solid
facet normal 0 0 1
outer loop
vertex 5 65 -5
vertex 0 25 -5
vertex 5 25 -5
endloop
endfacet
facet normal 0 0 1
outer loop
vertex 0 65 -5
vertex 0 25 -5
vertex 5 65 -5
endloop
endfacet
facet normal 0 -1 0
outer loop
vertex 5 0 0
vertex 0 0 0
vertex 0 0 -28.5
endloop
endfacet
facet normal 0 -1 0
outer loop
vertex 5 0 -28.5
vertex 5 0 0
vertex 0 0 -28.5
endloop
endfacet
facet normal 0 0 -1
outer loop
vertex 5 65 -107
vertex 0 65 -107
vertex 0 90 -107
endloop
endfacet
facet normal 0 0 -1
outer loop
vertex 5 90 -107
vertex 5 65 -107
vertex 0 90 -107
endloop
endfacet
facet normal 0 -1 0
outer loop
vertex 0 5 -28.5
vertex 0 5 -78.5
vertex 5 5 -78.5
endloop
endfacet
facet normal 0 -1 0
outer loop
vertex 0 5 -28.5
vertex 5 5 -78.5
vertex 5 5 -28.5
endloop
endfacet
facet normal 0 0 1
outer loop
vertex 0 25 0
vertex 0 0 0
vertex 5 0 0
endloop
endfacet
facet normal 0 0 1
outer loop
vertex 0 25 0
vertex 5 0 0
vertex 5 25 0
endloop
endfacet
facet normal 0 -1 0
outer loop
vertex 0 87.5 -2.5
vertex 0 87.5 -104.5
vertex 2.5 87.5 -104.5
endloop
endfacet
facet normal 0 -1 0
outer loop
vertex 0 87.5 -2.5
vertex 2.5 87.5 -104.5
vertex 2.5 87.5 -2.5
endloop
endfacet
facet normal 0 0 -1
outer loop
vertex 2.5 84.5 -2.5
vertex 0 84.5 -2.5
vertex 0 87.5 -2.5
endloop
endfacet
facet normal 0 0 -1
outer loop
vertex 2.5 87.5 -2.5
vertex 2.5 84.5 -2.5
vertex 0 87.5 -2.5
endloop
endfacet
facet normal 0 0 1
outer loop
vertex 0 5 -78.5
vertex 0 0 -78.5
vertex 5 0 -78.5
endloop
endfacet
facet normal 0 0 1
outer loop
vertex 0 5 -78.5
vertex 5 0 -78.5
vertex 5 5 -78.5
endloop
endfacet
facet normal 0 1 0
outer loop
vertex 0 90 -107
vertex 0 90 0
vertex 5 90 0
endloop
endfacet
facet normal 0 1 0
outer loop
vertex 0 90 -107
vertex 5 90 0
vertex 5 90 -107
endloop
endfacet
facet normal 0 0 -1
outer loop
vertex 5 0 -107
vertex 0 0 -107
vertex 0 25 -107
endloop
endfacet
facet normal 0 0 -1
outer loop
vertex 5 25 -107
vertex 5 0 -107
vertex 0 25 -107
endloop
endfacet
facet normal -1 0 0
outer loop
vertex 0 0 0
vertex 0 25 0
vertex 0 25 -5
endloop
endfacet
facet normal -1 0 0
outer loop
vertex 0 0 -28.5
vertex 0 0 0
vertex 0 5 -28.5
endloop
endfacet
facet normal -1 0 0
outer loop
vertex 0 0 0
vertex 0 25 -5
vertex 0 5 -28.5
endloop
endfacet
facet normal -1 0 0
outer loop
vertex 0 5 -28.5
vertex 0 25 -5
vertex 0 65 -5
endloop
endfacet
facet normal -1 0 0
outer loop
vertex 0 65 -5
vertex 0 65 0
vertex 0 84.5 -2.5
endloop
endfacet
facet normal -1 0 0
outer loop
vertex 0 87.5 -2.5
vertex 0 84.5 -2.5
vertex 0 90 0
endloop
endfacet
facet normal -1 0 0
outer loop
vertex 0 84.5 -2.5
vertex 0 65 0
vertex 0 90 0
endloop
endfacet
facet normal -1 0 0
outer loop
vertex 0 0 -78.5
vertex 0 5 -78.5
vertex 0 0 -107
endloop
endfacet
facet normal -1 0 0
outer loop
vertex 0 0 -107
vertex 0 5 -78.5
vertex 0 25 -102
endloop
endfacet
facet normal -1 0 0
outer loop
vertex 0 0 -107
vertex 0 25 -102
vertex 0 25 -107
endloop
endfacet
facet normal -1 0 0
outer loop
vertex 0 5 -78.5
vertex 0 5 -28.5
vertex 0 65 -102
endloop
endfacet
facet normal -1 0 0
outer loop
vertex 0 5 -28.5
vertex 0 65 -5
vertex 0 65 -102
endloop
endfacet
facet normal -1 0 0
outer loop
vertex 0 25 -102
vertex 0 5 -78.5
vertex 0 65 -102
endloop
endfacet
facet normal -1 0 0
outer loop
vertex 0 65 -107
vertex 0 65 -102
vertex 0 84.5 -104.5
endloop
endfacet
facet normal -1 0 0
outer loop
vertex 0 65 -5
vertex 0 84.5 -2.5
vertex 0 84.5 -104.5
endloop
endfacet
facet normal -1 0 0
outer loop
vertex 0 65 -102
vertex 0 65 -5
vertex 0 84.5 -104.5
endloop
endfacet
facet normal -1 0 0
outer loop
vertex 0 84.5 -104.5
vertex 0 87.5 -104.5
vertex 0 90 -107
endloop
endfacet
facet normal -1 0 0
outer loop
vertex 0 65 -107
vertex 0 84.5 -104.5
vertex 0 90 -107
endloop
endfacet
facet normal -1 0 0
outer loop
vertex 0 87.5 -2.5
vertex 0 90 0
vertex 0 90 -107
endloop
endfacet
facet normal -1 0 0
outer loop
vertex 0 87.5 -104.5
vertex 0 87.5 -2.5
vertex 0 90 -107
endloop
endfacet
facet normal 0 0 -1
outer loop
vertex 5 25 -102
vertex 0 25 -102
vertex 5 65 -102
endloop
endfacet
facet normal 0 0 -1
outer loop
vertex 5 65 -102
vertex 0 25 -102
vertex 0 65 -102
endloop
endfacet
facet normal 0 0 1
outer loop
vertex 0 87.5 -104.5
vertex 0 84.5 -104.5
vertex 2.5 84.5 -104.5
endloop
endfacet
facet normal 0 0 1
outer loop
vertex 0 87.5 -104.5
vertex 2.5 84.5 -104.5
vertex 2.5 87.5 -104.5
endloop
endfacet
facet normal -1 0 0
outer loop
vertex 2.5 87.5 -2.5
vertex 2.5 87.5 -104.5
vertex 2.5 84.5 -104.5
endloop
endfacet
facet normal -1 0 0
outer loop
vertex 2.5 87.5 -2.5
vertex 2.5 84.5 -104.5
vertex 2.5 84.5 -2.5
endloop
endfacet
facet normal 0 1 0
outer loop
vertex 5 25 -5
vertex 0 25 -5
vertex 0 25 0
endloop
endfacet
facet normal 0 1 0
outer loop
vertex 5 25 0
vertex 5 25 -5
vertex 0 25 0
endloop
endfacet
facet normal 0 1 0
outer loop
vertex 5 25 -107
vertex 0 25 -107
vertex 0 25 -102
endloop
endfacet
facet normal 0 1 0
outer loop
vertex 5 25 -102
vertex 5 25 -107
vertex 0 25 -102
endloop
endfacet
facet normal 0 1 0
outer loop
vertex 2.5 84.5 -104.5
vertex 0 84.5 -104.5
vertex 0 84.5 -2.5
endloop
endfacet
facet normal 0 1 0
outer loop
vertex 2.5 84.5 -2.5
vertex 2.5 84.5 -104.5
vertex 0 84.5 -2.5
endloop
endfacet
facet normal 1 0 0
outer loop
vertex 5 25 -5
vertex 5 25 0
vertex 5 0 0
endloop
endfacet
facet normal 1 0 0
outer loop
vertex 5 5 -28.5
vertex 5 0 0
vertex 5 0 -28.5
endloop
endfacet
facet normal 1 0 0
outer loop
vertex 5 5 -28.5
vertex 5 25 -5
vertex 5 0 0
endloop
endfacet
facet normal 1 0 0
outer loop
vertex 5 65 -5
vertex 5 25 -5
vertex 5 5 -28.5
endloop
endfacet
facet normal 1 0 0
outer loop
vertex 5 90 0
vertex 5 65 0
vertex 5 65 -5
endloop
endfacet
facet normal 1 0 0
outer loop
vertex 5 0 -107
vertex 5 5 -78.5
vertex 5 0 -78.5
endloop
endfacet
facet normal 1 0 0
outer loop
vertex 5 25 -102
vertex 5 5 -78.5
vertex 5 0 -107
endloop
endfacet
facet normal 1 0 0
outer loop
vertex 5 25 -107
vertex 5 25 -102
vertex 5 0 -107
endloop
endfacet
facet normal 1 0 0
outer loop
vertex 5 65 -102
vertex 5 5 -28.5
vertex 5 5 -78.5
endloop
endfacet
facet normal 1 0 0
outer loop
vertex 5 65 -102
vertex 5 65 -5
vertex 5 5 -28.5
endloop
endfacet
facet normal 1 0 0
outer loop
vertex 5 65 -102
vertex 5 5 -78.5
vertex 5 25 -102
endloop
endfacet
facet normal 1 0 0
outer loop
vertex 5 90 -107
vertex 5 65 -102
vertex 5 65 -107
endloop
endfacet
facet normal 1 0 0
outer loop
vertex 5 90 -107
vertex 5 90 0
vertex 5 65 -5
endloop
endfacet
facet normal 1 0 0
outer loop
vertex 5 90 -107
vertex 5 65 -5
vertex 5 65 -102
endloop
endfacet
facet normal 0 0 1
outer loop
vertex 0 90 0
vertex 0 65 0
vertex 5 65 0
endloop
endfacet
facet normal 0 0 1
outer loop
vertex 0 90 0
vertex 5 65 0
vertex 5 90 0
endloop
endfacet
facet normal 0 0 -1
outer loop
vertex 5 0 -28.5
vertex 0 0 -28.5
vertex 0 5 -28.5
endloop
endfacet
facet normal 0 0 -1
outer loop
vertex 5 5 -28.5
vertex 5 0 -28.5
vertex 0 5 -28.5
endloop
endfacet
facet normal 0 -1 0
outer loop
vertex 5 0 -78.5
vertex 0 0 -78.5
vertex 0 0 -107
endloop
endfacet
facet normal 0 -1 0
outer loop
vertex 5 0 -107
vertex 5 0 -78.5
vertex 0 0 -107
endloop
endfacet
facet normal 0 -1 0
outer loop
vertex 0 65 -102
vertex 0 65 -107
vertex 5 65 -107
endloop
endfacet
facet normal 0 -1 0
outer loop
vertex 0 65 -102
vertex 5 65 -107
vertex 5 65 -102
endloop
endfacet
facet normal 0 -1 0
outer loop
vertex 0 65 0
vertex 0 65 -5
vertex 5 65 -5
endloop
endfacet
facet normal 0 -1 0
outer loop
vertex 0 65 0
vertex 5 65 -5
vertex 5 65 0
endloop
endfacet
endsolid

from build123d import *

# Parameters (mm, degrees)
SKETCH1_W           = 107
SKETCH1_H           = 90
BOSS_EXTRUDE1_DEPTH = 5
SKETCH5_W           = 5
SKETCH5_H           = 40
SKETCH5_W_2         = 50
SKETCH5_H_2         = 5
CUT_EXTRUDE2_DEPTH  = 140.907112042
SKETCH6_W           = 102
SKETCH6_H           = 3
CUT_EXTRUDE3_DEPTH  = 2.5


with BuildPart() as part:
    # Sketch1 → Boss-Extrude1 (new body)
    with BuildSketch(Plane(origin=(0, 0, 0), x_dir=(0, 0, -1), z_dir=(1, 0, 0))):
        with Locations((53.5, 45)):
            Rectangle(SKETCH1_W, SKETCH1_H)
    extrude(amount=BOSS_EXTRUDE1_DEPTH)

    # Sketch5 → Cut-Extrude2 (cut, through all)
    with BuildSketch(Plane.ZY):
        with Locations((-104.5, 45)):
            Rectangle(SKETCH5_W, SKETCH5_H)
        with Locations((-2.5, 45)):
            Rectangle(SKETCH5_W, SKETCH5_H)
        with Locations((-53.5, 2.5)):
            Rectangle(SKETCH5_W_2, SKETCH5_H_2)
    extrude(amount=-CUT_EXTRUDE2_DEPTH, mode=Mode.SUBTRACT)

    # Sketch6 → Cut-Extrude3 (cut)
    with BuildSketch(Plane.ZY):
        with Locations((-53.5, 86)):
            Rectangle(SKETCH6_W, SKETCH6_H)
    extrude(amount=-CUT_EXTRUDE3_DEPTH, mode=Mode.SUBTRACT)


solid = part.part
